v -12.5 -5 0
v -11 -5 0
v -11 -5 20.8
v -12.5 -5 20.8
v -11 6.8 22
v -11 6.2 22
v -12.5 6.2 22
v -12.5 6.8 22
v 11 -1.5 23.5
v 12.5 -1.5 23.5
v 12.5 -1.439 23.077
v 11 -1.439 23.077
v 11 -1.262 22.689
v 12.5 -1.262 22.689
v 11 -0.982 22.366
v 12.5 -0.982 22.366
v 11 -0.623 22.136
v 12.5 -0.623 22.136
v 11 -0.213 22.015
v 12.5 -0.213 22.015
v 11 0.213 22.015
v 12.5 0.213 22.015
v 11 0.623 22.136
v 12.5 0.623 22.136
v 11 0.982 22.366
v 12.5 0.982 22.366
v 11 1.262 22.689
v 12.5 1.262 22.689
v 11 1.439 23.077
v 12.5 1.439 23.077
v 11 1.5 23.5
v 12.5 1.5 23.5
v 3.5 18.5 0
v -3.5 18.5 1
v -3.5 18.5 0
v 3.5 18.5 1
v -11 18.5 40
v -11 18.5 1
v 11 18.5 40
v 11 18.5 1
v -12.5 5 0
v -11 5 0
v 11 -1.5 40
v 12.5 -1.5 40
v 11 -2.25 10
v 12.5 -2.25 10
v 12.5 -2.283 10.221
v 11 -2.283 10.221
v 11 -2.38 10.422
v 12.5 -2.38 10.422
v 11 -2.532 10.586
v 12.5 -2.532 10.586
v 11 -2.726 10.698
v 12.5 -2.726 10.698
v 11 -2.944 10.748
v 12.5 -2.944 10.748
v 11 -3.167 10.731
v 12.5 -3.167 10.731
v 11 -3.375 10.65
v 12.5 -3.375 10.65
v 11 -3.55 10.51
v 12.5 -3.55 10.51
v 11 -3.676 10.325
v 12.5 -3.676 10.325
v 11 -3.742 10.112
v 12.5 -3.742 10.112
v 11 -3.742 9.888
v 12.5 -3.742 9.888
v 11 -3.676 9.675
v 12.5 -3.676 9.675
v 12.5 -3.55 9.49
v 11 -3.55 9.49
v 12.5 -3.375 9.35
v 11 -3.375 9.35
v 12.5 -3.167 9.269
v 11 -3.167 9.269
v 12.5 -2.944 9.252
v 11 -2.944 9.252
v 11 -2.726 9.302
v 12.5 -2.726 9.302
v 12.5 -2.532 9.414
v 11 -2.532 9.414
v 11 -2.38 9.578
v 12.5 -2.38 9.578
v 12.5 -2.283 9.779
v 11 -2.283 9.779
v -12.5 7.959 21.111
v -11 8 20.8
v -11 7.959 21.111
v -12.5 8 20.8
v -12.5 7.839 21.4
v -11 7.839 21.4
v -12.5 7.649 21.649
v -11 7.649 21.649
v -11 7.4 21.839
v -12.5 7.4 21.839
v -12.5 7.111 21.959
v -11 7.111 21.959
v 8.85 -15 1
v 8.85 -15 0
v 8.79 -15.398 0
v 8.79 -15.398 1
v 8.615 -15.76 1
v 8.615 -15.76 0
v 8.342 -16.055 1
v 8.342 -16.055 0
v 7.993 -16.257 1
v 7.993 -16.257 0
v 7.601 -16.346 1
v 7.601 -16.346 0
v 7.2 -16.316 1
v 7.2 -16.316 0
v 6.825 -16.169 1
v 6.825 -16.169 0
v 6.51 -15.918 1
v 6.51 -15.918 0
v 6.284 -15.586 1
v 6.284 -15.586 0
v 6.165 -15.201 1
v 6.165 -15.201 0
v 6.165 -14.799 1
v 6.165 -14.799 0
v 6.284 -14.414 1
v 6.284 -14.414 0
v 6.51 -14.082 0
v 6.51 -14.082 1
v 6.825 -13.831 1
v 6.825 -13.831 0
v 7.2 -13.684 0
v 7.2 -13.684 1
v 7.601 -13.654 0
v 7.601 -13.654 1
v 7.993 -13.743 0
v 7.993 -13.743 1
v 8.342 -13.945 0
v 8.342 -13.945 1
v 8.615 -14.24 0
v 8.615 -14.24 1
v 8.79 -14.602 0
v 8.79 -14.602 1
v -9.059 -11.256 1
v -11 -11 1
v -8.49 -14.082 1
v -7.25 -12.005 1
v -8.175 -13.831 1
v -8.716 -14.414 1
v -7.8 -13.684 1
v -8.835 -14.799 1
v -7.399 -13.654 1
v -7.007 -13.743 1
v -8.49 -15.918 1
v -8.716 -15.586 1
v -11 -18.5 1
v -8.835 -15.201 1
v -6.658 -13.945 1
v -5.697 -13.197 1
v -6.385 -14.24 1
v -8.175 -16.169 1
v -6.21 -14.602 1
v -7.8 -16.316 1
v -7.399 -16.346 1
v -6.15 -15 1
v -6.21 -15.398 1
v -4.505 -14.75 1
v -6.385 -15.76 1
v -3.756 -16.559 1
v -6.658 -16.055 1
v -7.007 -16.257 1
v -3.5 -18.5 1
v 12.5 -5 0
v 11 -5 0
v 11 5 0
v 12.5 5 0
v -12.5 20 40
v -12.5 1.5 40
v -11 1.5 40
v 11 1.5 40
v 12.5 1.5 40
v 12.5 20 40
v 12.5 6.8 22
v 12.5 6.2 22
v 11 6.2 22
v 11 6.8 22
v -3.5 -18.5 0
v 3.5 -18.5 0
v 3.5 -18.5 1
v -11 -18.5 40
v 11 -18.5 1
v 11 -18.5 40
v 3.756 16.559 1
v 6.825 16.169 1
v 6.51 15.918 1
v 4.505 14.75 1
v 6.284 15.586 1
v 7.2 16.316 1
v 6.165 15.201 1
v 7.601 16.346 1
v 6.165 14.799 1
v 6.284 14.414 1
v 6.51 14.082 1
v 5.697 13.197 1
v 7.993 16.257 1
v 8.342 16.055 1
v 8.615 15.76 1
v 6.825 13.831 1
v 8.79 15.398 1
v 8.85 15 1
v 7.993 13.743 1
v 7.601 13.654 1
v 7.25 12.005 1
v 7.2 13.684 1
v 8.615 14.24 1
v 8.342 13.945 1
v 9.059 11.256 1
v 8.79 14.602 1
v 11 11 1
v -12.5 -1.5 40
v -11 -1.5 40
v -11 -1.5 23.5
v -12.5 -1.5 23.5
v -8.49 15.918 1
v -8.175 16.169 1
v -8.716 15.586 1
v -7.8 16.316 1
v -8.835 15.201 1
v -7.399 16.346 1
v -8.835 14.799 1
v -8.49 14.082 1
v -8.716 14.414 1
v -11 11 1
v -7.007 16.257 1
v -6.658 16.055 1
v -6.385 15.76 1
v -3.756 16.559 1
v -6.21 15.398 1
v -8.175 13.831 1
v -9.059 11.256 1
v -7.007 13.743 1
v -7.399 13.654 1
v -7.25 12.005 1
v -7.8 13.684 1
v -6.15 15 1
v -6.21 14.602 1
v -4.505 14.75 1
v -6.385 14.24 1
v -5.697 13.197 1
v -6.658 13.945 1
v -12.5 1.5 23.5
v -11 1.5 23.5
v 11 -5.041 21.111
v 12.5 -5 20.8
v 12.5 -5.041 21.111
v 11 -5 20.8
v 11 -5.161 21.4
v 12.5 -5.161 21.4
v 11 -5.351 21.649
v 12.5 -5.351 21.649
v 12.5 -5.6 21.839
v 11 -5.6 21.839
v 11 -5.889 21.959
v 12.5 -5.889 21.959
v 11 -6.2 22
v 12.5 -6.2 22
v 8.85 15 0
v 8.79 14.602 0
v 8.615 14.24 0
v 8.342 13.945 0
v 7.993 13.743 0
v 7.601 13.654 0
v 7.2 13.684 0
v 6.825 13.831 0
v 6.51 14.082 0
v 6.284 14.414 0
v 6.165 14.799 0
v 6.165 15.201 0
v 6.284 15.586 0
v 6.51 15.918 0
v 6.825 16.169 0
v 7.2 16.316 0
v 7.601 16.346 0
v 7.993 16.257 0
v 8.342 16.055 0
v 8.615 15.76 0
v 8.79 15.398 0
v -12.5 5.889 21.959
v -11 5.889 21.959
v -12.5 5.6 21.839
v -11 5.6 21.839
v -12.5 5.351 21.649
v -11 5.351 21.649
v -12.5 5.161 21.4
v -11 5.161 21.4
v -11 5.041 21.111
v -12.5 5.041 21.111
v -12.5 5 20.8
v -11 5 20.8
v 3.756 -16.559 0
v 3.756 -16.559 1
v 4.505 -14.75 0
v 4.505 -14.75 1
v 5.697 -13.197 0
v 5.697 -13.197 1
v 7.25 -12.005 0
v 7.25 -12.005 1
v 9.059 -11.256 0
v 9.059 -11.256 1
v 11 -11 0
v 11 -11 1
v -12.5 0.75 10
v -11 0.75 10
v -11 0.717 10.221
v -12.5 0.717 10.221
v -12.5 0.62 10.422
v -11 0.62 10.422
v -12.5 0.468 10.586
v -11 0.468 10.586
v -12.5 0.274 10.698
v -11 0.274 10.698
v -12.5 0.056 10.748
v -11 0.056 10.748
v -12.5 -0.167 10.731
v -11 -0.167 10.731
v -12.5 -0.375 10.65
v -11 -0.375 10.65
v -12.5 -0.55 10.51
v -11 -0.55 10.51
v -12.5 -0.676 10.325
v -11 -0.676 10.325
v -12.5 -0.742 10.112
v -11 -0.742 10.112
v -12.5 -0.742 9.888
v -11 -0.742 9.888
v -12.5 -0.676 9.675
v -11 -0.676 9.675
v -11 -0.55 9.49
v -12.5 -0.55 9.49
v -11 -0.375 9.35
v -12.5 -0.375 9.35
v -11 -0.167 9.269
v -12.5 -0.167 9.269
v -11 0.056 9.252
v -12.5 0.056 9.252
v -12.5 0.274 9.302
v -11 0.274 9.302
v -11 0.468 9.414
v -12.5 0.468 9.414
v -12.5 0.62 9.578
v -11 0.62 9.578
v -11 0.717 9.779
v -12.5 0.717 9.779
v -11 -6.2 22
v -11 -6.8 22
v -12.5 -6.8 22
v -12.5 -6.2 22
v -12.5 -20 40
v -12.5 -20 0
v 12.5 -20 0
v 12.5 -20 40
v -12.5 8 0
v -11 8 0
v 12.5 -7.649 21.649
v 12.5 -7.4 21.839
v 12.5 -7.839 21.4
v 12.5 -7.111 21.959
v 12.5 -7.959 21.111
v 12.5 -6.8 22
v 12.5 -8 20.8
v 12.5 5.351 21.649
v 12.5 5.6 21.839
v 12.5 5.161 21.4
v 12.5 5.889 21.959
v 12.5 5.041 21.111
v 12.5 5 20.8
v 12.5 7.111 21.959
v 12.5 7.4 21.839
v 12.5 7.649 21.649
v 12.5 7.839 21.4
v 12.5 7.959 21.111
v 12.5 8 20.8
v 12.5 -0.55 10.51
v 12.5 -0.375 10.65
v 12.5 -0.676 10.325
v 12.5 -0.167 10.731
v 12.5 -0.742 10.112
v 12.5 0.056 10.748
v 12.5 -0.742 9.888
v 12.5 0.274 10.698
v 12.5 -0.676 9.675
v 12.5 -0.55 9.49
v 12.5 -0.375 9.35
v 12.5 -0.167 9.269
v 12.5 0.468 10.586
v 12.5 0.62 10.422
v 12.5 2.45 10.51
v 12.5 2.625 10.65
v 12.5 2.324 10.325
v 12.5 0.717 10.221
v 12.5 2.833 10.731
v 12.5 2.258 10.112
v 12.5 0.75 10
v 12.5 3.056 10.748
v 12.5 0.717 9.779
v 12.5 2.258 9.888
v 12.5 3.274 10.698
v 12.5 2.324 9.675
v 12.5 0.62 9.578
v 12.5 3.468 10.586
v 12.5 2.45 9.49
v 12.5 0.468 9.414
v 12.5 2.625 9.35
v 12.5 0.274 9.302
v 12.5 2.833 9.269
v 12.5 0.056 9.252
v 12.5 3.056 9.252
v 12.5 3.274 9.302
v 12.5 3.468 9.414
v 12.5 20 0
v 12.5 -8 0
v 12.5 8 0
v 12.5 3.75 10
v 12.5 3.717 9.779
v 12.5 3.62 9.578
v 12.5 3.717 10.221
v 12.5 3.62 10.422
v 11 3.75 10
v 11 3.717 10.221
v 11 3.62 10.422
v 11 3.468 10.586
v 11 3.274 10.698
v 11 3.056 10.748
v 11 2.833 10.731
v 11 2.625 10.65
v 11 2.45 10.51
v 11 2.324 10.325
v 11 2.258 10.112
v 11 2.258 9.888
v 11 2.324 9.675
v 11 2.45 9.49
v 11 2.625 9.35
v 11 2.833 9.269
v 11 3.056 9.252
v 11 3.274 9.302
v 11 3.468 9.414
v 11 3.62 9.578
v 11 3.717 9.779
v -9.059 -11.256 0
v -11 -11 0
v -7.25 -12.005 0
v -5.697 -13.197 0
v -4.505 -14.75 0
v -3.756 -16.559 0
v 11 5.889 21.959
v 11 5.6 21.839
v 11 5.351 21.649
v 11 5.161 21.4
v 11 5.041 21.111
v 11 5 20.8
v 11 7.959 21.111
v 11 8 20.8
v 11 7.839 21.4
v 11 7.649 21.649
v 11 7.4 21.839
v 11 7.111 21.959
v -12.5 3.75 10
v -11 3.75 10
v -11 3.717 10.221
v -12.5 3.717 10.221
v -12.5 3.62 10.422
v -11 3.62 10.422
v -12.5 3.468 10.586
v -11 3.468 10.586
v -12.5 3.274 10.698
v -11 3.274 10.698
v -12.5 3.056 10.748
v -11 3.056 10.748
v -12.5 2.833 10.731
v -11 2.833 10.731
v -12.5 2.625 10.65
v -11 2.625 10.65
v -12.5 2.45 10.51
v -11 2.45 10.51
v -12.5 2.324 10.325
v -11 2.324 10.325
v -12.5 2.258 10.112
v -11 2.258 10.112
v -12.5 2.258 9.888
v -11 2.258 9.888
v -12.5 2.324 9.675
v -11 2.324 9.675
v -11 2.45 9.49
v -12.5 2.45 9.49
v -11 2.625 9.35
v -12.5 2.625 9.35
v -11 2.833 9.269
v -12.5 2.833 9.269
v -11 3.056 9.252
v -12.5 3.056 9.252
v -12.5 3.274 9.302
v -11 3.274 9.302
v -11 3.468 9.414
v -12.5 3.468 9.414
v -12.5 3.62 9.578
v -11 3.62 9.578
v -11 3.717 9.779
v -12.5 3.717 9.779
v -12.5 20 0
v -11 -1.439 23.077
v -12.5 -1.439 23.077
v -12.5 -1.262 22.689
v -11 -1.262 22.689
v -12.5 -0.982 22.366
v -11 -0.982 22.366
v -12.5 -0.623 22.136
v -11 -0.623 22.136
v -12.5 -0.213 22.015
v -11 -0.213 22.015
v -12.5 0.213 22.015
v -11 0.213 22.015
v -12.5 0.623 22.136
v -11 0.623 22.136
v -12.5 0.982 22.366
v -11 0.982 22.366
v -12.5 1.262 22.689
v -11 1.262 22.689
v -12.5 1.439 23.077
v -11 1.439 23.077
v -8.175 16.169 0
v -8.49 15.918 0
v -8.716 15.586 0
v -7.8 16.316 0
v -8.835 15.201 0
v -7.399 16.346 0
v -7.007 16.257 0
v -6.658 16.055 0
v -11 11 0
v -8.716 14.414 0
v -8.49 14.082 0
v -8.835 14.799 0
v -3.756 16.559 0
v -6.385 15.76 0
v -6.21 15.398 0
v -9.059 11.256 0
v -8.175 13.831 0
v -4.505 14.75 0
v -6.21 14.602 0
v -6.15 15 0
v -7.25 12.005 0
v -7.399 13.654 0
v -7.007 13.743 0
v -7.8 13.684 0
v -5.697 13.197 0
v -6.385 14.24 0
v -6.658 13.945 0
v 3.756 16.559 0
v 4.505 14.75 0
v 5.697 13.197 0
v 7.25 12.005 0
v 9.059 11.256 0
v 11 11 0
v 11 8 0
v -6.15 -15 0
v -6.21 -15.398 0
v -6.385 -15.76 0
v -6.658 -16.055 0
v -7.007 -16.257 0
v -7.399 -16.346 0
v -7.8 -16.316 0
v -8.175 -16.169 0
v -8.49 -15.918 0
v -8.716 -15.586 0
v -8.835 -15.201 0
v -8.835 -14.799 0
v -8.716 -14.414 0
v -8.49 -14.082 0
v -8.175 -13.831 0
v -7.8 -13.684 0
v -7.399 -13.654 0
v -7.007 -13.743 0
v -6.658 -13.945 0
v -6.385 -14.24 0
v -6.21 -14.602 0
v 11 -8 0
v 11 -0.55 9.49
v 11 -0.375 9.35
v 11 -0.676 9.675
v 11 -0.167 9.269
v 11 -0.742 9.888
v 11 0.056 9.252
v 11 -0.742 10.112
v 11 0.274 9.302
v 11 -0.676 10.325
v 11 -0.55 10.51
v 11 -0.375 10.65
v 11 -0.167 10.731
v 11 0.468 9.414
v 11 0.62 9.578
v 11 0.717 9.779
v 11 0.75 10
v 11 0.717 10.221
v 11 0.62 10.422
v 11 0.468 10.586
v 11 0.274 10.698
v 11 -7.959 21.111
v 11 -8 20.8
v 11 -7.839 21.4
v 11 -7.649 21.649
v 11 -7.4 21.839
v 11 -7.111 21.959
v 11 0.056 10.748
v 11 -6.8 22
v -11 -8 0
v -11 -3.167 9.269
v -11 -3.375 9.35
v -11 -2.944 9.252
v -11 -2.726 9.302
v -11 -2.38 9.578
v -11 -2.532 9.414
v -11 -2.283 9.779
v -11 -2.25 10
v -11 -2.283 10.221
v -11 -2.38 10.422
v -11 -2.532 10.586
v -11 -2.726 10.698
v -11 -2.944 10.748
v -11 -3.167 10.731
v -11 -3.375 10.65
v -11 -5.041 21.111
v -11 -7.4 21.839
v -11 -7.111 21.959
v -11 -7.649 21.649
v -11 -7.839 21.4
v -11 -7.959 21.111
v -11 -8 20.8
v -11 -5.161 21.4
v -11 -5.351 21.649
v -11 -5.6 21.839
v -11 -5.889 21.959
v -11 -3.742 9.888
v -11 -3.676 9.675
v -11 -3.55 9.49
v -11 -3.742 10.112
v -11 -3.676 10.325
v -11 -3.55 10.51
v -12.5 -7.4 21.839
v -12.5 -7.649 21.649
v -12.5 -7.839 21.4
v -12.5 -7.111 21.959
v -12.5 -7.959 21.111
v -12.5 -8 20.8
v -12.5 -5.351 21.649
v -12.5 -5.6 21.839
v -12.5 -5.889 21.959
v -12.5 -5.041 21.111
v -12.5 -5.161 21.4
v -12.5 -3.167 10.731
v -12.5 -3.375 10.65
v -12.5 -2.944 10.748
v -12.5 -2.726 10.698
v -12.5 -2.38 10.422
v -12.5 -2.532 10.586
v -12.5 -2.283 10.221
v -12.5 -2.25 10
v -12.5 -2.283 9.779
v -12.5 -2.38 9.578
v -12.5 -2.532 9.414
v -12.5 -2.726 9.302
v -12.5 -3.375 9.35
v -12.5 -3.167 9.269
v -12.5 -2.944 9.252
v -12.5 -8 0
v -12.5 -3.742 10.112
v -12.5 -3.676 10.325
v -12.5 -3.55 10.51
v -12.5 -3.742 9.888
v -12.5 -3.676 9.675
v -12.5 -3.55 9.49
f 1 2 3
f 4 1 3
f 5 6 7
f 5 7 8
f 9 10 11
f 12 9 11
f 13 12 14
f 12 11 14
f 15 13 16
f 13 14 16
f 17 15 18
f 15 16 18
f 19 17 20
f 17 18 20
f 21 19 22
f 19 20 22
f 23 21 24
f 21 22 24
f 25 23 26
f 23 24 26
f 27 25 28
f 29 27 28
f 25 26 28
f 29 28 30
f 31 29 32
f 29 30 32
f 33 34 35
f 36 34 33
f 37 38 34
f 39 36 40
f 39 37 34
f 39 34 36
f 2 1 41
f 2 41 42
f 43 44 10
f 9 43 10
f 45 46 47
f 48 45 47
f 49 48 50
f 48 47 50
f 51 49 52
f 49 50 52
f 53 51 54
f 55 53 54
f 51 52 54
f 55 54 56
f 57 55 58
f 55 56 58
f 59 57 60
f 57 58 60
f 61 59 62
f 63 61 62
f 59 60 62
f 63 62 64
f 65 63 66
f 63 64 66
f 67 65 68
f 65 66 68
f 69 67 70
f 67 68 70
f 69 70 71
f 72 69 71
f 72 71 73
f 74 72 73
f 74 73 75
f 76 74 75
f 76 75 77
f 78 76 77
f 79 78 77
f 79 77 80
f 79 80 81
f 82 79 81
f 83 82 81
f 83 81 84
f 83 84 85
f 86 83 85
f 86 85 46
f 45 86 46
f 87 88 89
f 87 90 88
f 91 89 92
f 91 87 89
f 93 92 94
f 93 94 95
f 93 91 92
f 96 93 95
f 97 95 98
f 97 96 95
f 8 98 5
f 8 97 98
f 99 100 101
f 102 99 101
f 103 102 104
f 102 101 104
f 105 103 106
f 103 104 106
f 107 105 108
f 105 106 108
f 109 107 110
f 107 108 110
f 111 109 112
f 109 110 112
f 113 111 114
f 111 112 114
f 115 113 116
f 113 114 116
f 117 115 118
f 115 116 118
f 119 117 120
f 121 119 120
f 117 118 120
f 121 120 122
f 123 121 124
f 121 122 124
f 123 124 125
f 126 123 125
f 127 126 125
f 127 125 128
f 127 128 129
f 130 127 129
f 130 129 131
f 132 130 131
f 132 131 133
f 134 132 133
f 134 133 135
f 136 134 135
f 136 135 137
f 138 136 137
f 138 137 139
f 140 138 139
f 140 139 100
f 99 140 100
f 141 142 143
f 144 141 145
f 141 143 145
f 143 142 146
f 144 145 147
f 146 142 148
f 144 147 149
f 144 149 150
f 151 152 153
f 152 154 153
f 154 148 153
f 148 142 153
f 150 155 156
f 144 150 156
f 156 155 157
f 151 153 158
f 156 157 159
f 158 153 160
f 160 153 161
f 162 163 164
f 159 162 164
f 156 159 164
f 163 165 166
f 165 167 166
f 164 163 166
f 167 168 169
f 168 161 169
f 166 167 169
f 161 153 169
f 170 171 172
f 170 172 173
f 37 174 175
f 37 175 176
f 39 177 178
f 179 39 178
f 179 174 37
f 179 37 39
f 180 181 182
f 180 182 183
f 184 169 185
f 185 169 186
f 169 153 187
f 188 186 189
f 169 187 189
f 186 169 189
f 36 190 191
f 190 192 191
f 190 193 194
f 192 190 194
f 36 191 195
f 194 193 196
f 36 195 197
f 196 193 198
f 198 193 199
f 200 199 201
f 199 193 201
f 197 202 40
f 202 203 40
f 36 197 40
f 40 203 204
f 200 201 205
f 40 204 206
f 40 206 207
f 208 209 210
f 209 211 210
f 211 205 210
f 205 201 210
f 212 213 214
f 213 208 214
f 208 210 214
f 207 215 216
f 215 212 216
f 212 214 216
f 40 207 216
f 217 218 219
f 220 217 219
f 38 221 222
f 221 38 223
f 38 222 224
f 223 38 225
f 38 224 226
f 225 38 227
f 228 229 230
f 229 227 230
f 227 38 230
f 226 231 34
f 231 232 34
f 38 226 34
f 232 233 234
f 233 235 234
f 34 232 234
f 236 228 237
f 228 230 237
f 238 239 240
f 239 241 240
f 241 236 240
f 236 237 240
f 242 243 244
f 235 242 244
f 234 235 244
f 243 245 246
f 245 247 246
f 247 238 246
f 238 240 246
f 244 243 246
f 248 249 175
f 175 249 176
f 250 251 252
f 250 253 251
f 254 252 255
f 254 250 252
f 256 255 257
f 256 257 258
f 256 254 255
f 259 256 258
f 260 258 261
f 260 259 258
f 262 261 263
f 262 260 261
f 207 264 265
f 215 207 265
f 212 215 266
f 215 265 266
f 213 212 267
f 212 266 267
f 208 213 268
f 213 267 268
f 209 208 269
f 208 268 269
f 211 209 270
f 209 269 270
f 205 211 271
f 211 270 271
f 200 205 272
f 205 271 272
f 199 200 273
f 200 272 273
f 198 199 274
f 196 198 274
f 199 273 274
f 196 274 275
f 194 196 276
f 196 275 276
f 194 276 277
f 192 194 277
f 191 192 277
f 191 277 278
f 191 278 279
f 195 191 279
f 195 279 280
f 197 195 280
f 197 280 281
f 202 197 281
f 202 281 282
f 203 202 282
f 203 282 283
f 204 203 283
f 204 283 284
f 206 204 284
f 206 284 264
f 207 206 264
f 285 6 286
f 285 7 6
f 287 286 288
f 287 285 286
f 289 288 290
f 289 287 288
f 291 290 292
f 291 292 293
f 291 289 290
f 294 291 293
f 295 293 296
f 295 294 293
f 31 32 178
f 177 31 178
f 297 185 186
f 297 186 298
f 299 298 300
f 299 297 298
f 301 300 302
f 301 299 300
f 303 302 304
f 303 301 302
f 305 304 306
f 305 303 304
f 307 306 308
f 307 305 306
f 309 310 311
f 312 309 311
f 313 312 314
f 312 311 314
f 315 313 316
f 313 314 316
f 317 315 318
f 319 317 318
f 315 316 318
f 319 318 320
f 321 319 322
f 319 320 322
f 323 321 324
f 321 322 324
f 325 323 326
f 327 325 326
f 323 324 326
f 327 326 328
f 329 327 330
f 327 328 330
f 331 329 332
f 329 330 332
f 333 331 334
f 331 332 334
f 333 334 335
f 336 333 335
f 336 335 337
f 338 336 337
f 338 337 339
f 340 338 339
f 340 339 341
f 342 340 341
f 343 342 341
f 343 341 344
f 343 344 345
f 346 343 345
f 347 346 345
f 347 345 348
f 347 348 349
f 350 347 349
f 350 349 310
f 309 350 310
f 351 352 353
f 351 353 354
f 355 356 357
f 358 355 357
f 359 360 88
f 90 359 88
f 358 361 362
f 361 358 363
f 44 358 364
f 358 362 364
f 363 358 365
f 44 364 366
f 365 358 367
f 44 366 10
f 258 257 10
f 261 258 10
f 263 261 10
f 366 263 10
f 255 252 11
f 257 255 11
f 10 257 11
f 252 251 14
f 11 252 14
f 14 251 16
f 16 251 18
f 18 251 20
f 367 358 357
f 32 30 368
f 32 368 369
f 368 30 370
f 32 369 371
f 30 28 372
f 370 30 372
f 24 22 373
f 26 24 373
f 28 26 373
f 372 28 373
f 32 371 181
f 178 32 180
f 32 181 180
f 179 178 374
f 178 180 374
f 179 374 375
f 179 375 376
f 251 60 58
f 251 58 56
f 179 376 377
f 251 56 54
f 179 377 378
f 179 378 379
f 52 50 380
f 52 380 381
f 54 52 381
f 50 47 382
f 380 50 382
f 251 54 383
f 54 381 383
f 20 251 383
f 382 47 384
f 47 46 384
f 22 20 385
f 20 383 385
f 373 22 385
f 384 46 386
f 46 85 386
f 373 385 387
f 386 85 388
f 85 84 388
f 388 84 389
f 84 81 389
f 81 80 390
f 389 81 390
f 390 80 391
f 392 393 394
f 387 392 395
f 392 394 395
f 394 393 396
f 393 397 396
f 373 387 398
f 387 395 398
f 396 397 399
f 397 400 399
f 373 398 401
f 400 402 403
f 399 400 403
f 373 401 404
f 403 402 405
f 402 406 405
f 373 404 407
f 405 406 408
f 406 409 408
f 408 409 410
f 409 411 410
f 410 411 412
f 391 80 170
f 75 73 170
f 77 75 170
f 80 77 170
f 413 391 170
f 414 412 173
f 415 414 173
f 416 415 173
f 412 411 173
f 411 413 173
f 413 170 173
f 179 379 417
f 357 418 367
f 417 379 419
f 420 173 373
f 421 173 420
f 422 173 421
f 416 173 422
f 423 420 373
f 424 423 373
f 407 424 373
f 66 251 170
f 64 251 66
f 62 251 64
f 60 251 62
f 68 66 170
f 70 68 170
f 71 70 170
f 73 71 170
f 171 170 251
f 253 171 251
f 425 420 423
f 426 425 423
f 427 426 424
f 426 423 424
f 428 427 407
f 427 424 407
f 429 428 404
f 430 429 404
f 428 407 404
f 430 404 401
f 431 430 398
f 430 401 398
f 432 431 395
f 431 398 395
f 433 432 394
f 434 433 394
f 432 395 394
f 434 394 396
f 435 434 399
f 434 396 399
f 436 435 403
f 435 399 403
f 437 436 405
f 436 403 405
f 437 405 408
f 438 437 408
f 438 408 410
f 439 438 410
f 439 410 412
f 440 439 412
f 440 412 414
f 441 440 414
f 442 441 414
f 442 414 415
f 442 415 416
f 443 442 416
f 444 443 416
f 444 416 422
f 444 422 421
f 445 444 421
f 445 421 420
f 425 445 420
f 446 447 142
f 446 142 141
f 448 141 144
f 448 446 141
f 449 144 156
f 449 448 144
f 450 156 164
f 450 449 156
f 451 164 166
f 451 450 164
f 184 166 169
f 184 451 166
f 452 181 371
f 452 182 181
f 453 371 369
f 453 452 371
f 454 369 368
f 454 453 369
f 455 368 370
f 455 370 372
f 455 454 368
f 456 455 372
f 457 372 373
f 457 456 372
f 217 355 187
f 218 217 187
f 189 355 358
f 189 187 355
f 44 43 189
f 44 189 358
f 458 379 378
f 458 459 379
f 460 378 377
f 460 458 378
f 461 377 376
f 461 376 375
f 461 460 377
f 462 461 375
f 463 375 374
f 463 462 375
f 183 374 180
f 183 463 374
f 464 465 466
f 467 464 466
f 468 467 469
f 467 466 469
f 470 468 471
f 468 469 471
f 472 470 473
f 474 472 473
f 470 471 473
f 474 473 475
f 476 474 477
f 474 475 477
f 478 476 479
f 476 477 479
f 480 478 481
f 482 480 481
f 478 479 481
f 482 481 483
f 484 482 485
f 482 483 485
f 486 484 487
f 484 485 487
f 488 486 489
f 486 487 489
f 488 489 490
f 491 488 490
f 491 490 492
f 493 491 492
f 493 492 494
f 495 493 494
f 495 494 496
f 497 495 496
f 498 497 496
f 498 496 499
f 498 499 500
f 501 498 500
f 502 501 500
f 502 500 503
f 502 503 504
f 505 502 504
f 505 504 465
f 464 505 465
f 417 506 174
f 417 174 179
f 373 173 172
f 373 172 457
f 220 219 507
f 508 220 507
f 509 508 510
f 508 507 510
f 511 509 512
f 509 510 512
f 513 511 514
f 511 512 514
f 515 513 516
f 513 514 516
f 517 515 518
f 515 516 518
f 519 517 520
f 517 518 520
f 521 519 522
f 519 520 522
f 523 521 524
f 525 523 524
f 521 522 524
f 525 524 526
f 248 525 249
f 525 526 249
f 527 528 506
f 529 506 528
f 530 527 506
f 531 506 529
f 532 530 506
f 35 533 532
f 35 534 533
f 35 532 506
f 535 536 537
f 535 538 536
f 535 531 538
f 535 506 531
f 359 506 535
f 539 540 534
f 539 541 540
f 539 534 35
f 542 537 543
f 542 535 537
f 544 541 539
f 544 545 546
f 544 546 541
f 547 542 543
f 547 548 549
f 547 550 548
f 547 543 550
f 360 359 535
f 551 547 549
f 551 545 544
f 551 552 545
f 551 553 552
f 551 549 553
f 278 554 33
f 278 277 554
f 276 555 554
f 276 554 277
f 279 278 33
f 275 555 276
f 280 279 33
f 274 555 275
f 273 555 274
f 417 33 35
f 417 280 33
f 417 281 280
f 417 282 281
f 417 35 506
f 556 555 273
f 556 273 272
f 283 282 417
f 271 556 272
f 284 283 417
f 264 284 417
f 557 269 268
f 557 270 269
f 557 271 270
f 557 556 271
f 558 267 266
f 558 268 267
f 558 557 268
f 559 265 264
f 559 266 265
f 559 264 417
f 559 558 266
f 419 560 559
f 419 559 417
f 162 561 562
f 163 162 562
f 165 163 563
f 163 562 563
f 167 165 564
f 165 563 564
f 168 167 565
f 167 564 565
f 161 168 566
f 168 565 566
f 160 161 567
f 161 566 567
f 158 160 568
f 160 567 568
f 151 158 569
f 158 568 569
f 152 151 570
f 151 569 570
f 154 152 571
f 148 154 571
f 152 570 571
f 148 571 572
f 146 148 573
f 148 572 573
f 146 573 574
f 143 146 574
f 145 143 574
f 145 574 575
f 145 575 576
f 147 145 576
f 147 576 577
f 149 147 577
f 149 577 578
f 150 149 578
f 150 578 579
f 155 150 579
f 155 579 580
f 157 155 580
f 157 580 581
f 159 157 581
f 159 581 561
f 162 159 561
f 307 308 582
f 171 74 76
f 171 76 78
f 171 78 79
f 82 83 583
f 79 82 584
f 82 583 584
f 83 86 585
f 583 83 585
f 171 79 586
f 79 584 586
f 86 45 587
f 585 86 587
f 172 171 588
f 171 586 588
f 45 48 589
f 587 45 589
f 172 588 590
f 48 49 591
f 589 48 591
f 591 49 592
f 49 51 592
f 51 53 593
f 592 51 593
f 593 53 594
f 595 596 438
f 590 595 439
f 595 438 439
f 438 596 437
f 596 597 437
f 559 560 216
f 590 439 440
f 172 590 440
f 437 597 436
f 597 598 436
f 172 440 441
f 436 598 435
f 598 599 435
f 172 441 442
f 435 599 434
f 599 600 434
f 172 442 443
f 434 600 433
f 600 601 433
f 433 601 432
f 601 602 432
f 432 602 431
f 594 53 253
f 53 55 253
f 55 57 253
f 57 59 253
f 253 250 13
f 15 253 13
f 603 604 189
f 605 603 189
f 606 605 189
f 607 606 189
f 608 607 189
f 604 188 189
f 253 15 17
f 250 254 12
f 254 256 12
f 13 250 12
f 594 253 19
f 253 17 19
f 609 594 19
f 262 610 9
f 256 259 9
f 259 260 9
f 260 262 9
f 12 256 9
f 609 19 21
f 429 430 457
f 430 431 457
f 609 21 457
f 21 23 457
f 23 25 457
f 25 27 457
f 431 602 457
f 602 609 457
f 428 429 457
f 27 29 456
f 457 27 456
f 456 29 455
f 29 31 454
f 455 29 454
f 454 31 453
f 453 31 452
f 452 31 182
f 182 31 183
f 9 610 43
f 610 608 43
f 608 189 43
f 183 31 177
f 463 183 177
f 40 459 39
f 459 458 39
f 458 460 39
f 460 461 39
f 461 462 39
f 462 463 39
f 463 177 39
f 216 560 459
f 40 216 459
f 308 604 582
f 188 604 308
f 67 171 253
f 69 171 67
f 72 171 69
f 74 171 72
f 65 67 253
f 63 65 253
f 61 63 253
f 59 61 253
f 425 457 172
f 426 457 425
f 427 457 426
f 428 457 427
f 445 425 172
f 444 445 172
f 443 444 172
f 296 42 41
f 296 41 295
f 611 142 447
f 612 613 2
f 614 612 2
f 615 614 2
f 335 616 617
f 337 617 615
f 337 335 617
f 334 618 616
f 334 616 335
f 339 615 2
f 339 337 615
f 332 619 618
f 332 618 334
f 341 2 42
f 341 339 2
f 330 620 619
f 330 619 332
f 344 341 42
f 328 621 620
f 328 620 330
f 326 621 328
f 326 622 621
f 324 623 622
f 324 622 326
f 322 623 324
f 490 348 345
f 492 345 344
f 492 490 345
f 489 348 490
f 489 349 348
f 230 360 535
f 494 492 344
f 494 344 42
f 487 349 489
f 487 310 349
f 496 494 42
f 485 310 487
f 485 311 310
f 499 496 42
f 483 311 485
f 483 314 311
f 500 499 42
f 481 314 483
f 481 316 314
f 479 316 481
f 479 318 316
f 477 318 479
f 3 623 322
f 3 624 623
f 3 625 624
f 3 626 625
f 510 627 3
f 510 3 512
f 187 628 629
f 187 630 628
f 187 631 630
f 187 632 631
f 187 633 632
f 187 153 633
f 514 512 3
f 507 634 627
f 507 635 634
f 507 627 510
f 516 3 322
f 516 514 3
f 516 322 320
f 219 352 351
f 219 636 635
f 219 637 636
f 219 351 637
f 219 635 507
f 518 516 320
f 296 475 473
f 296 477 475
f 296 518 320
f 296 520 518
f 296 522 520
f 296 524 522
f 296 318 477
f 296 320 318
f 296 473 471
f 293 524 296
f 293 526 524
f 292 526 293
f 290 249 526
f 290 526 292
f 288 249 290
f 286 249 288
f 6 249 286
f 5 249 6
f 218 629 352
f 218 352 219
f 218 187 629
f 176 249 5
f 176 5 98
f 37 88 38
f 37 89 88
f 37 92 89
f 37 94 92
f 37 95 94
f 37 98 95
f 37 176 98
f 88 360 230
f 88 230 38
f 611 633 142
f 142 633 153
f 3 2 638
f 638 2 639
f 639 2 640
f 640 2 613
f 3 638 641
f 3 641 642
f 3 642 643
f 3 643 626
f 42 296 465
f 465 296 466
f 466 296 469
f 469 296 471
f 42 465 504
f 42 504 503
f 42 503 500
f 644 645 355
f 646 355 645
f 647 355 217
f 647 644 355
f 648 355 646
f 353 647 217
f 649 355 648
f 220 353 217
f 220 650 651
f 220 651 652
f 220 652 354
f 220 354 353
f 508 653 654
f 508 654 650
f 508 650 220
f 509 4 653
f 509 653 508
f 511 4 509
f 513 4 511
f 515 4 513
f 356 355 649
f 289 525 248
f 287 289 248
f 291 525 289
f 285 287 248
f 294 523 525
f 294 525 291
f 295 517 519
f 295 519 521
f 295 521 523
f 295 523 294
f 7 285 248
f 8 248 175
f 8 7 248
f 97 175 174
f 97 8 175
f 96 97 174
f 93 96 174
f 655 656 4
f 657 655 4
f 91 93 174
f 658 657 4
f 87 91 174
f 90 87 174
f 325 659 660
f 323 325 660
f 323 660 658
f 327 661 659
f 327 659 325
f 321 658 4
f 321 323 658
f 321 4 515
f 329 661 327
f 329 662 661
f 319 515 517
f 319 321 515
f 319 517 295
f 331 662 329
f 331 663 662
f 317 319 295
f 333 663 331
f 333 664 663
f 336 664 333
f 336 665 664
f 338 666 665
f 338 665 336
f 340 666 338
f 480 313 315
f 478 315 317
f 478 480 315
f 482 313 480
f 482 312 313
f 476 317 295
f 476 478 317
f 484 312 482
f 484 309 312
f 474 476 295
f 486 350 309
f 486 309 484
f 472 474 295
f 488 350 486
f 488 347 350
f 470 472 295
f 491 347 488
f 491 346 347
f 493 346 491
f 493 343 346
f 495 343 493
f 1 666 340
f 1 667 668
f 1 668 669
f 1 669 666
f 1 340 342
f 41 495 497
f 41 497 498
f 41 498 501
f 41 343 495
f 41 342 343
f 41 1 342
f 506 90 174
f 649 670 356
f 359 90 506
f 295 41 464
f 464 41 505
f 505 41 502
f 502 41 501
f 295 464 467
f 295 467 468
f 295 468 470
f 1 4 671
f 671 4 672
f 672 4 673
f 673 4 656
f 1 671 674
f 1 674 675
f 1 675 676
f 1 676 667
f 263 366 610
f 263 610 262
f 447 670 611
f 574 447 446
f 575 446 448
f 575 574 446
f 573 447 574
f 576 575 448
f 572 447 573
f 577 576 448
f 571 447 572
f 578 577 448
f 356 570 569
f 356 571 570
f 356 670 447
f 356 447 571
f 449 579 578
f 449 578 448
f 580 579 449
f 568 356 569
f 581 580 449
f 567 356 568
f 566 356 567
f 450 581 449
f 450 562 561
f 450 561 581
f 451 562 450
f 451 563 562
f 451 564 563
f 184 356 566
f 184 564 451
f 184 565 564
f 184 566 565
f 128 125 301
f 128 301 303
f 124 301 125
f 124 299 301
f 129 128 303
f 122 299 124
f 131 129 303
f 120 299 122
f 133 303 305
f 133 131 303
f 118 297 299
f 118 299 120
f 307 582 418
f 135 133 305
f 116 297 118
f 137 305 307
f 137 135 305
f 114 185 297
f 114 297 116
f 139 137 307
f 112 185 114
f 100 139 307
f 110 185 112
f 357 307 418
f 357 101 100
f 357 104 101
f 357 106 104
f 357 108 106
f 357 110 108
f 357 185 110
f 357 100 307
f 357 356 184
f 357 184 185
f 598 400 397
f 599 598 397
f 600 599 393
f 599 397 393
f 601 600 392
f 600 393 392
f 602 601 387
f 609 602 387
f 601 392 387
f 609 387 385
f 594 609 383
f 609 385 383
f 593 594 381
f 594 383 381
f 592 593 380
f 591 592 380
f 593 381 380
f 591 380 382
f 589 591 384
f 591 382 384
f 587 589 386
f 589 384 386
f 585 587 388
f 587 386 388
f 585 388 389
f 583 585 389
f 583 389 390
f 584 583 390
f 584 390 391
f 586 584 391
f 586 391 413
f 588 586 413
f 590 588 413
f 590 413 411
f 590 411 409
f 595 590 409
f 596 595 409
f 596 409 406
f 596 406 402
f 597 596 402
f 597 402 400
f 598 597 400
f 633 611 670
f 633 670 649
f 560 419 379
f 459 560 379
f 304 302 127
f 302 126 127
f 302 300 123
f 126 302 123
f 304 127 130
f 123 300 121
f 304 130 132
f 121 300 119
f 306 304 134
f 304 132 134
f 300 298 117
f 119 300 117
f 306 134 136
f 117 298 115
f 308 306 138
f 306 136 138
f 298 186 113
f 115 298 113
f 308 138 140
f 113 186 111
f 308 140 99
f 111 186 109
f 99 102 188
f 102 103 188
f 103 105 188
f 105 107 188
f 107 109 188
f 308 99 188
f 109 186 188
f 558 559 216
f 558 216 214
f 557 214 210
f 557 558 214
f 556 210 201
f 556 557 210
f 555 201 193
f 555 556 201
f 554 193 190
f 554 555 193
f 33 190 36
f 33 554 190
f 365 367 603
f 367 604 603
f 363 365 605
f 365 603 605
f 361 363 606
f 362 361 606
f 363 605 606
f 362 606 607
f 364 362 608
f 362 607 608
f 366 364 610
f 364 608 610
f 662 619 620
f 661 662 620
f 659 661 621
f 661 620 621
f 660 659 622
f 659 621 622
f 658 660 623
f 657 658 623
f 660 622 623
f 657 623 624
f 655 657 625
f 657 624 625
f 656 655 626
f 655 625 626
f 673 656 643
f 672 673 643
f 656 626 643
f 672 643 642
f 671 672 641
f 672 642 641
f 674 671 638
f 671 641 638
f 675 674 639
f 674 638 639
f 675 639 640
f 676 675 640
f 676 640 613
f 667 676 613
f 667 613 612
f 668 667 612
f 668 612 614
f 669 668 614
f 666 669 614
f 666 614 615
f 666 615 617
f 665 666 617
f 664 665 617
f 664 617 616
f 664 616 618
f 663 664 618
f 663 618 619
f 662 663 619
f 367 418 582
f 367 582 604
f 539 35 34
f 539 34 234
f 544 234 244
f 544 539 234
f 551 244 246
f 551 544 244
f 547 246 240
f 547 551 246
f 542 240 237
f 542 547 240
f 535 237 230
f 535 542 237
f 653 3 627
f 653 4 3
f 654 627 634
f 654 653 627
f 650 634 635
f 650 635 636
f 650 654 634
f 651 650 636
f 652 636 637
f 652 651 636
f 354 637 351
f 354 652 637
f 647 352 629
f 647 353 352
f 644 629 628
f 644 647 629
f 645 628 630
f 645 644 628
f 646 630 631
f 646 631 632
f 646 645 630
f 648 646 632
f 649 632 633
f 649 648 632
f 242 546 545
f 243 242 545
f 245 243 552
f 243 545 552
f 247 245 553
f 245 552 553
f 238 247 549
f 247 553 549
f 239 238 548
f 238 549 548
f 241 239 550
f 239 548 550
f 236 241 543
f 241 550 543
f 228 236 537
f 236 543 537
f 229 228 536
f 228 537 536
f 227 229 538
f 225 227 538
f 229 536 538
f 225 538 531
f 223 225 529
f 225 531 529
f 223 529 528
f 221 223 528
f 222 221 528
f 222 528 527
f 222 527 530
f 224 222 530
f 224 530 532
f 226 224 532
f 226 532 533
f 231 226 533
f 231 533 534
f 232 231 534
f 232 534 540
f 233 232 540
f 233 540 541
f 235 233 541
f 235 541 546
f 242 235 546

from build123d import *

# Parameters (mm, degrees)
F0_W      = 25
F0_H      = 40
F1_DEPTH  = 40
F2_W      = 22
F2_H      = 37
F3_DEPTH  = 40.001
F5_DEPTH  = 1
F6_R      = 1.35
F7_DEPTH  = 40.001
F8_W      = 3
F8_H      = 22
F9_DEPTH  = 25.001
F10_R     = 1.2
F11_R     = 0.75
F12_DEPTH = 25.001


with BuildPart() as f1:
    # F0 (on Top) → F1 (new body)
    with BuildSketch(Plane.XY):
        Rectangle(F0_W, F0_H)
    extrude(amount=F1_DEPTH)

    # F2 (on face) → F3 (cut, through all)
    with BuildSketch(Plane.XY.offset(40)):
        Rectangle(F2_W, F2_H)
    extrude(amount=-F3_DEPTH, mode=Mode.SUBTRACT)

    # F4 (on face) → F5 (join)
    with BuildSketch(Plane(origin=(0, 0, 0), x_dir=(1, 0, 0), z_dir=(0, 0, -1))):
        with BuildLine():
            Line((-11, 18.5), (-11, 11))
            ThreePointArc((-11, 11), (-5.696699, 13.196699), (-3.5, 18.5))
            Line((-3.5, 18.5), (-11, 18.5))
        make_face()
        with BuildLine():
            Line((11, 18.5), (3.5, 18.5))
            ThreePointArc((3.5, 18.5), (5.696699, 13.196699), (11, 11))
            Line((11, 11), (11, 18.5))
        make_face()
        with BuildLine():
            Line((11, -18.5), (11, -11))
            ThreePointArc((11, -11), (5.696699, -13.196699), (3.5, -18.5))
            Line((3.5, -18.5), (11, -18.5))
        make_face()
        with BuildLine():
            Line((-11, -18.5), (-3.5, -18.5))
            ThreePointArc((-3.5, -18.5), (-5.696699, -13.196699), (-11, -11))
            Line((-11, -11), (-11, -18.5))
        make_face()
    extrude(amount=-F5_DEPTH)

    # F6 (on face) → F7 (cut, through all)
    with BuildSketch(Plane(origin=(0, 0, 0), x_dir=(1, 0, 0), z_dir=(0, 0, -1))):
        with Locations((7.5, 15)):
            Circle(F6_R)
        with Locations((-7.5, 15)):
            Circle(F6_R)
        with Locations((7.5, -15)):
            Circle(F6_R)
        with Locations((-7.5, -15)):
            Circle(F6_R)
    extrude(amount=-F7_DEPTH, mode=Mode.SUBTRACT)

    # F8 (on face) → F9 (cut, through all)
    with BuildSketch(Plane.YZ.offset(12.5)):
        with Locations((-6.5, 11)):
            Rectangle(F8_W, F8_H)
        with Locations((6.5, 11)):
            Rectangle(F8_W, F8_H)
        with BuildLine():
            Line((-1.5, 40), (-1.5, 23.5))
            ThreePointArc((-1.5, 23.5), (0, 22), (1.5, 23.5))
            Line((1.5, 23.5), (1.5, 40))
            Line((1.5, 40), (-1.5, 40))
        make_face()
    extrude(amount=-F9_DEPTH, mode=Mode.SUBTRACT)

    # F10
    f10_edges = [f1.edges().sort_by_distance(p)[0] for p in [
        (11.75, -5, 22),
        (-11.75, -5, 22),
        (11.75, -8, 22),
        (-11.75, -8, 22),
        (11.75, 5, 22),
        (-11.75, 5, 22),
        (11.75, 8, 22),
        (-11.75, 8, 22),
    ]]
    fillet(f10_edges, radius=F10_R)

    # F11 (on face) → F12 (cut, through all)
    with BuildSketch(Plane.YZ.offset(12.5)):
        with Locations((-3, 10)):
            Circle(F11_R)
        with Locations((0, 10)):
            Circle(F11_R)
        with Locations((3, 10)):
            Circle(F11_R)
    extrude(amount=-F12_DEPTH, mode=Mode.SUBTRACT)


solid = f1.part
